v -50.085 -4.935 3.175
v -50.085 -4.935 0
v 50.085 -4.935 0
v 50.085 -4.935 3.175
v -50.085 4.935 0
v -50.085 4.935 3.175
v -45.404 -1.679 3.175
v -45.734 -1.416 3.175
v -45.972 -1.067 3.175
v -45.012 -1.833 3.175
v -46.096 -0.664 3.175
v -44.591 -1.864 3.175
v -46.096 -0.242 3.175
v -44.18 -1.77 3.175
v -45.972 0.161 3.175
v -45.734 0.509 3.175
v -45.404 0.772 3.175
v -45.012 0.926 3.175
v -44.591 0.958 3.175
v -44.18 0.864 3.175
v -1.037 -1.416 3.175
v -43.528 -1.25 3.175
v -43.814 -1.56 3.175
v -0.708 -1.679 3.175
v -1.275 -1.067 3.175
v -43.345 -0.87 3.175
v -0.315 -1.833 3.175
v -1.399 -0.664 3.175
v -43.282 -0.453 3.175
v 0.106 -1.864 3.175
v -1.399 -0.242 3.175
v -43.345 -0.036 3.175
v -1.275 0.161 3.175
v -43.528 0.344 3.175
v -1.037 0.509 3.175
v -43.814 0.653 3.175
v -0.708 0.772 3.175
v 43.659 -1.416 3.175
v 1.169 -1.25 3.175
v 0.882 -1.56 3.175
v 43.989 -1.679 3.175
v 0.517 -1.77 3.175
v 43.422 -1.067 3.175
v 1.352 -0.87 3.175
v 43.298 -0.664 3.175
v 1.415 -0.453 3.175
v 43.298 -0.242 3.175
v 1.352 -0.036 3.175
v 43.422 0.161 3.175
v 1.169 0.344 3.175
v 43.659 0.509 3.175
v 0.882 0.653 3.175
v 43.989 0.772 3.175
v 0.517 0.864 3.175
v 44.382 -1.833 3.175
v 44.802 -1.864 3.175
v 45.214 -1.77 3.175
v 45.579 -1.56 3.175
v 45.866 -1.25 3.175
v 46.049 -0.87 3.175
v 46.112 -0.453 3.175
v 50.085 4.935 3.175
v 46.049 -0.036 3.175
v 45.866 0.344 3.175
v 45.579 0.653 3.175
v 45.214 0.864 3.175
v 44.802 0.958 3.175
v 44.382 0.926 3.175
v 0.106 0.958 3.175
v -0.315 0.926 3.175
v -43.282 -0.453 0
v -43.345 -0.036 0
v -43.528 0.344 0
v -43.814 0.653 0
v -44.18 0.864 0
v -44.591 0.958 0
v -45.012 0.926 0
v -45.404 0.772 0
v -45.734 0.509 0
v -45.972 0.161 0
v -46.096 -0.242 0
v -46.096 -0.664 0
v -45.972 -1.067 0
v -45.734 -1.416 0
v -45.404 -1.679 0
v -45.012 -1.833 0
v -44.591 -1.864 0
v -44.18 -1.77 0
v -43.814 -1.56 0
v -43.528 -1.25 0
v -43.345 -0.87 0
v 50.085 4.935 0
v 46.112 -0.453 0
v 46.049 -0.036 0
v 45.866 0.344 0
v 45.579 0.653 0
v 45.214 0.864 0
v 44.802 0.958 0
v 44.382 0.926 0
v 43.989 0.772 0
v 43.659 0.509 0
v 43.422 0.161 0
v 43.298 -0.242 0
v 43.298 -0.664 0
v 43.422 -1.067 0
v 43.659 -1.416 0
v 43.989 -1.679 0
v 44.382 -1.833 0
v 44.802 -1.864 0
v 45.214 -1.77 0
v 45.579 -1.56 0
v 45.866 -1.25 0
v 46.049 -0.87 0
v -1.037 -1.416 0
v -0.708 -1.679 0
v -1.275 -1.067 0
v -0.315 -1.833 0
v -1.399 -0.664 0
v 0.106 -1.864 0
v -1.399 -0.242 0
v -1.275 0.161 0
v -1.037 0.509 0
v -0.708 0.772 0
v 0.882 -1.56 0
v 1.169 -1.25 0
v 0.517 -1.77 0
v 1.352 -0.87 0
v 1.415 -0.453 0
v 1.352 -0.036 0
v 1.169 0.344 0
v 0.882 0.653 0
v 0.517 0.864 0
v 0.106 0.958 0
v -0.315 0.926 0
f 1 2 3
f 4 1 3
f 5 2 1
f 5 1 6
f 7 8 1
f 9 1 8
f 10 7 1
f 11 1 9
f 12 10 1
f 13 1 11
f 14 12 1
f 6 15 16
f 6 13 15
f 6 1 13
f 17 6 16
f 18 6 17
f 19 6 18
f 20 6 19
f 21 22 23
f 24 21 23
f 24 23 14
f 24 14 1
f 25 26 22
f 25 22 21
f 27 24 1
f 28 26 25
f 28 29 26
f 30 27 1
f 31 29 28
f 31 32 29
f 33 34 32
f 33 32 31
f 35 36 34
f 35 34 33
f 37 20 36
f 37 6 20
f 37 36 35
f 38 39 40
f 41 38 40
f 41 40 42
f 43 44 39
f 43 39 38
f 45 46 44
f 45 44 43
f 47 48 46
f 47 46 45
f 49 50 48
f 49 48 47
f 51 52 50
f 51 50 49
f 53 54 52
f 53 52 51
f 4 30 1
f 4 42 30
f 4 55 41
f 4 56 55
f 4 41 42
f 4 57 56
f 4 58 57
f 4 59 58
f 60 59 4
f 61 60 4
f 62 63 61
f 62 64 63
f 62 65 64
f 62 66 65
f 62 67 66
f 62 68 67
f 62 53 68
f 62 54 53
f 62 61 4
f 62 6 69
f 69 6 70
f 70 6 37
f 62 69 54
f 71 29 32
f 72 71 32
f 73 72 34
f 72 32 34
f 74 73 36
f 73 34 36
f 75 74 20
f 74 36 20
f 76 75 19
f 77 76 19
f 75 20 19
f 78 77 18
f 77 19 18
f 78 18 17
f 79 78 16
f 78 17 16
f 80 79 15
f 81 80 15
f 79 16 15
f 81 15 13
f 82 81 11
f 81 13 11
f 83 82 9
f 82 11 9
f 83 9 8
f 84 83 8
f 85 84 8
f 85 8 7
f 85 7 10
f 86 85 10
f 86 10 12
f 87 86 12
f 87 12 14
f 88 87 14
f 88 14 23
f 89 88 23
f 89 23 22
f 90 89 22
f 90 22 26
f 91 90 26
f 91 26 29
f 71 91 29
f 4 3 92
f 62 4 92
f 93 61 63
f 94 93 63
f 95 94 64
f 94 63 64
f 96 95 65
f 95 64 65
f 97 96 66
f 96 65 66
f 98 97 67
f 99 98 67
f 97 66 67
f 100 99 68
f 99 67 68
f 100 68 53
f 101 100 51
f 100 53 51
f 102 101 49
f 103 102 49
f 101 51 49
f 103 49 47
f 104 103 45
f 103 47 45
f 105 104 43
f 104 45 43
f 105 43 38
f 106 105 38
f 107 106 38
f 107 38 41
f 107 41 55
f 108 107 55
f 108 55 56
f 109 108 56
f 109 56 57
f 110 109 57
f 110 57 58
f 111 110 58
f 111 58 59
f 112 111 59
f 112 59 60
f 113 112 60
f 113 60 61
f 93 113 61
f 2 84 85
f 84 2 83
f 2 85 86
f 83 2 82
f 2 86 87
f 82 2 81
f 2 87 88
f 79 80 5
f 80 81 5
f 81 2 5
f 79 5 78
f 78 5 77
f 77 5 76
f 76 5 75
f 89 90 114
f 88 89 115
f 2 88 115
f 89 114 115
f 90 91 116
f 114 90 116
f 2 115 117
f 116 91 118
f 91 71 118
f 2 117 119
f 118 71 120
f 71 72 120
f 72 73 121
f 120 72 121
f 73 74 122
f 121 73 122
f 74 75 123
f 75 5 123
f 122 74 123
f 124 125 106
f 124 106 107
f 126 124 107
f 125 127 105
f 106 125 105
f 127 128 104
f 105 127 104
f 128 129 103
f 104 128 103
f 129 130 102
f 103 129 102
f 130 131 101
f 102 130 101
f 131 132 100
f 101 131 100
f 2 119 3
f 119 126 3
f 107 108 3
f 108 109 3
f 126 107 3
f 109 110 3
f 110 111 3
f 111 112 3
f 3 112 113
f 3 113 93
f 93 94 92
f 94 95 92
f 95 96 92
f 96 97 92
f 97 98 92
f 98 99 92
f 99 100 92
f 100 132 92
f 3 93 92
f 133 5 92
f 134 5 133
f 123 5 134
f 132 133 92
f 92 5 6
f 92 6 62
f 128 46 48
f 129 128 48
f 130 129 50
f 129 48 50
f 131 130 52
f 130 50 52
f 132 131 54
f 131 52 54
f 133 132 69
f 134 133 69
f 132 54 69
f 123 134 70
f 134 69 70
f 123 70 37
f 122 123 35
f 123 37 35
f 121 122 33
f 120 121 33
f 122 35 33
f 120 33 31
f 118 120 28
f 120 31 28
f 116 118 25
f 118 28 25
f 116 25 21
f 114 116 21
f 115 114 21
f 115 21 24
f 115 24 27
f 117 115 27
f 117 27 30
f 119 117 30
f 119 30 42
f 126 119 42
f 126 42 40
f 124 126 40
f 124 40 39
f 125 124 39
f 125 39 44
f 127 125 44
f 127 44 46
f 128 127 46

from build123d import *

# Parameters (mm, degrees)
SKETCH1_W           = 100.17
SKETCH1_H           = 9.87
BOSS_EXTRUDE1_DEPTH = 3.175
SKETCH2_R           = 1.415
CUT_EXTRUDE1_DEPTH  = 4.175
SKETCH3_R           = 1.415
CUT_EXTRUDE2_DEPTH  = 4.175


with BuildPart() as part:
    # Sketch1 → Boss-Extrude1 (new body)
    with BuildSketch(Plane.XY):
        Rectangle(SKETCH1_W, SKETCH1_H)
    extrude(amount=BOSS_EXTRUDE1_DEPTH)

    # Sketch2 → Cut-Extrude1 (cut, through all)
    with BuildSketch(Plane.XY.offset(3.175)):
        with Locations((-44.696699141, -0.453300859)):
            Circle(SKETCH2_R)
        with Locations((44.696699141, -0.453300859)):
            Circle(SKETCH2_R)
    extrude(amount=-CUT_EXTRUDE1_DEPTH, mode=Mode.SUBTRACT)

    # Sketch3 → Cut-Extrude2 (cut, through all)
    with BuildSketch(Plane.XY.offset(3.175)):
        with Locations((0, -0.453300859)):
            Circle(SKETCH3_R)
    extrude(amount=-CUT_EXTRUDE2_DEPTH, mode=Mode.SUBTRACT)


solid = part.part
